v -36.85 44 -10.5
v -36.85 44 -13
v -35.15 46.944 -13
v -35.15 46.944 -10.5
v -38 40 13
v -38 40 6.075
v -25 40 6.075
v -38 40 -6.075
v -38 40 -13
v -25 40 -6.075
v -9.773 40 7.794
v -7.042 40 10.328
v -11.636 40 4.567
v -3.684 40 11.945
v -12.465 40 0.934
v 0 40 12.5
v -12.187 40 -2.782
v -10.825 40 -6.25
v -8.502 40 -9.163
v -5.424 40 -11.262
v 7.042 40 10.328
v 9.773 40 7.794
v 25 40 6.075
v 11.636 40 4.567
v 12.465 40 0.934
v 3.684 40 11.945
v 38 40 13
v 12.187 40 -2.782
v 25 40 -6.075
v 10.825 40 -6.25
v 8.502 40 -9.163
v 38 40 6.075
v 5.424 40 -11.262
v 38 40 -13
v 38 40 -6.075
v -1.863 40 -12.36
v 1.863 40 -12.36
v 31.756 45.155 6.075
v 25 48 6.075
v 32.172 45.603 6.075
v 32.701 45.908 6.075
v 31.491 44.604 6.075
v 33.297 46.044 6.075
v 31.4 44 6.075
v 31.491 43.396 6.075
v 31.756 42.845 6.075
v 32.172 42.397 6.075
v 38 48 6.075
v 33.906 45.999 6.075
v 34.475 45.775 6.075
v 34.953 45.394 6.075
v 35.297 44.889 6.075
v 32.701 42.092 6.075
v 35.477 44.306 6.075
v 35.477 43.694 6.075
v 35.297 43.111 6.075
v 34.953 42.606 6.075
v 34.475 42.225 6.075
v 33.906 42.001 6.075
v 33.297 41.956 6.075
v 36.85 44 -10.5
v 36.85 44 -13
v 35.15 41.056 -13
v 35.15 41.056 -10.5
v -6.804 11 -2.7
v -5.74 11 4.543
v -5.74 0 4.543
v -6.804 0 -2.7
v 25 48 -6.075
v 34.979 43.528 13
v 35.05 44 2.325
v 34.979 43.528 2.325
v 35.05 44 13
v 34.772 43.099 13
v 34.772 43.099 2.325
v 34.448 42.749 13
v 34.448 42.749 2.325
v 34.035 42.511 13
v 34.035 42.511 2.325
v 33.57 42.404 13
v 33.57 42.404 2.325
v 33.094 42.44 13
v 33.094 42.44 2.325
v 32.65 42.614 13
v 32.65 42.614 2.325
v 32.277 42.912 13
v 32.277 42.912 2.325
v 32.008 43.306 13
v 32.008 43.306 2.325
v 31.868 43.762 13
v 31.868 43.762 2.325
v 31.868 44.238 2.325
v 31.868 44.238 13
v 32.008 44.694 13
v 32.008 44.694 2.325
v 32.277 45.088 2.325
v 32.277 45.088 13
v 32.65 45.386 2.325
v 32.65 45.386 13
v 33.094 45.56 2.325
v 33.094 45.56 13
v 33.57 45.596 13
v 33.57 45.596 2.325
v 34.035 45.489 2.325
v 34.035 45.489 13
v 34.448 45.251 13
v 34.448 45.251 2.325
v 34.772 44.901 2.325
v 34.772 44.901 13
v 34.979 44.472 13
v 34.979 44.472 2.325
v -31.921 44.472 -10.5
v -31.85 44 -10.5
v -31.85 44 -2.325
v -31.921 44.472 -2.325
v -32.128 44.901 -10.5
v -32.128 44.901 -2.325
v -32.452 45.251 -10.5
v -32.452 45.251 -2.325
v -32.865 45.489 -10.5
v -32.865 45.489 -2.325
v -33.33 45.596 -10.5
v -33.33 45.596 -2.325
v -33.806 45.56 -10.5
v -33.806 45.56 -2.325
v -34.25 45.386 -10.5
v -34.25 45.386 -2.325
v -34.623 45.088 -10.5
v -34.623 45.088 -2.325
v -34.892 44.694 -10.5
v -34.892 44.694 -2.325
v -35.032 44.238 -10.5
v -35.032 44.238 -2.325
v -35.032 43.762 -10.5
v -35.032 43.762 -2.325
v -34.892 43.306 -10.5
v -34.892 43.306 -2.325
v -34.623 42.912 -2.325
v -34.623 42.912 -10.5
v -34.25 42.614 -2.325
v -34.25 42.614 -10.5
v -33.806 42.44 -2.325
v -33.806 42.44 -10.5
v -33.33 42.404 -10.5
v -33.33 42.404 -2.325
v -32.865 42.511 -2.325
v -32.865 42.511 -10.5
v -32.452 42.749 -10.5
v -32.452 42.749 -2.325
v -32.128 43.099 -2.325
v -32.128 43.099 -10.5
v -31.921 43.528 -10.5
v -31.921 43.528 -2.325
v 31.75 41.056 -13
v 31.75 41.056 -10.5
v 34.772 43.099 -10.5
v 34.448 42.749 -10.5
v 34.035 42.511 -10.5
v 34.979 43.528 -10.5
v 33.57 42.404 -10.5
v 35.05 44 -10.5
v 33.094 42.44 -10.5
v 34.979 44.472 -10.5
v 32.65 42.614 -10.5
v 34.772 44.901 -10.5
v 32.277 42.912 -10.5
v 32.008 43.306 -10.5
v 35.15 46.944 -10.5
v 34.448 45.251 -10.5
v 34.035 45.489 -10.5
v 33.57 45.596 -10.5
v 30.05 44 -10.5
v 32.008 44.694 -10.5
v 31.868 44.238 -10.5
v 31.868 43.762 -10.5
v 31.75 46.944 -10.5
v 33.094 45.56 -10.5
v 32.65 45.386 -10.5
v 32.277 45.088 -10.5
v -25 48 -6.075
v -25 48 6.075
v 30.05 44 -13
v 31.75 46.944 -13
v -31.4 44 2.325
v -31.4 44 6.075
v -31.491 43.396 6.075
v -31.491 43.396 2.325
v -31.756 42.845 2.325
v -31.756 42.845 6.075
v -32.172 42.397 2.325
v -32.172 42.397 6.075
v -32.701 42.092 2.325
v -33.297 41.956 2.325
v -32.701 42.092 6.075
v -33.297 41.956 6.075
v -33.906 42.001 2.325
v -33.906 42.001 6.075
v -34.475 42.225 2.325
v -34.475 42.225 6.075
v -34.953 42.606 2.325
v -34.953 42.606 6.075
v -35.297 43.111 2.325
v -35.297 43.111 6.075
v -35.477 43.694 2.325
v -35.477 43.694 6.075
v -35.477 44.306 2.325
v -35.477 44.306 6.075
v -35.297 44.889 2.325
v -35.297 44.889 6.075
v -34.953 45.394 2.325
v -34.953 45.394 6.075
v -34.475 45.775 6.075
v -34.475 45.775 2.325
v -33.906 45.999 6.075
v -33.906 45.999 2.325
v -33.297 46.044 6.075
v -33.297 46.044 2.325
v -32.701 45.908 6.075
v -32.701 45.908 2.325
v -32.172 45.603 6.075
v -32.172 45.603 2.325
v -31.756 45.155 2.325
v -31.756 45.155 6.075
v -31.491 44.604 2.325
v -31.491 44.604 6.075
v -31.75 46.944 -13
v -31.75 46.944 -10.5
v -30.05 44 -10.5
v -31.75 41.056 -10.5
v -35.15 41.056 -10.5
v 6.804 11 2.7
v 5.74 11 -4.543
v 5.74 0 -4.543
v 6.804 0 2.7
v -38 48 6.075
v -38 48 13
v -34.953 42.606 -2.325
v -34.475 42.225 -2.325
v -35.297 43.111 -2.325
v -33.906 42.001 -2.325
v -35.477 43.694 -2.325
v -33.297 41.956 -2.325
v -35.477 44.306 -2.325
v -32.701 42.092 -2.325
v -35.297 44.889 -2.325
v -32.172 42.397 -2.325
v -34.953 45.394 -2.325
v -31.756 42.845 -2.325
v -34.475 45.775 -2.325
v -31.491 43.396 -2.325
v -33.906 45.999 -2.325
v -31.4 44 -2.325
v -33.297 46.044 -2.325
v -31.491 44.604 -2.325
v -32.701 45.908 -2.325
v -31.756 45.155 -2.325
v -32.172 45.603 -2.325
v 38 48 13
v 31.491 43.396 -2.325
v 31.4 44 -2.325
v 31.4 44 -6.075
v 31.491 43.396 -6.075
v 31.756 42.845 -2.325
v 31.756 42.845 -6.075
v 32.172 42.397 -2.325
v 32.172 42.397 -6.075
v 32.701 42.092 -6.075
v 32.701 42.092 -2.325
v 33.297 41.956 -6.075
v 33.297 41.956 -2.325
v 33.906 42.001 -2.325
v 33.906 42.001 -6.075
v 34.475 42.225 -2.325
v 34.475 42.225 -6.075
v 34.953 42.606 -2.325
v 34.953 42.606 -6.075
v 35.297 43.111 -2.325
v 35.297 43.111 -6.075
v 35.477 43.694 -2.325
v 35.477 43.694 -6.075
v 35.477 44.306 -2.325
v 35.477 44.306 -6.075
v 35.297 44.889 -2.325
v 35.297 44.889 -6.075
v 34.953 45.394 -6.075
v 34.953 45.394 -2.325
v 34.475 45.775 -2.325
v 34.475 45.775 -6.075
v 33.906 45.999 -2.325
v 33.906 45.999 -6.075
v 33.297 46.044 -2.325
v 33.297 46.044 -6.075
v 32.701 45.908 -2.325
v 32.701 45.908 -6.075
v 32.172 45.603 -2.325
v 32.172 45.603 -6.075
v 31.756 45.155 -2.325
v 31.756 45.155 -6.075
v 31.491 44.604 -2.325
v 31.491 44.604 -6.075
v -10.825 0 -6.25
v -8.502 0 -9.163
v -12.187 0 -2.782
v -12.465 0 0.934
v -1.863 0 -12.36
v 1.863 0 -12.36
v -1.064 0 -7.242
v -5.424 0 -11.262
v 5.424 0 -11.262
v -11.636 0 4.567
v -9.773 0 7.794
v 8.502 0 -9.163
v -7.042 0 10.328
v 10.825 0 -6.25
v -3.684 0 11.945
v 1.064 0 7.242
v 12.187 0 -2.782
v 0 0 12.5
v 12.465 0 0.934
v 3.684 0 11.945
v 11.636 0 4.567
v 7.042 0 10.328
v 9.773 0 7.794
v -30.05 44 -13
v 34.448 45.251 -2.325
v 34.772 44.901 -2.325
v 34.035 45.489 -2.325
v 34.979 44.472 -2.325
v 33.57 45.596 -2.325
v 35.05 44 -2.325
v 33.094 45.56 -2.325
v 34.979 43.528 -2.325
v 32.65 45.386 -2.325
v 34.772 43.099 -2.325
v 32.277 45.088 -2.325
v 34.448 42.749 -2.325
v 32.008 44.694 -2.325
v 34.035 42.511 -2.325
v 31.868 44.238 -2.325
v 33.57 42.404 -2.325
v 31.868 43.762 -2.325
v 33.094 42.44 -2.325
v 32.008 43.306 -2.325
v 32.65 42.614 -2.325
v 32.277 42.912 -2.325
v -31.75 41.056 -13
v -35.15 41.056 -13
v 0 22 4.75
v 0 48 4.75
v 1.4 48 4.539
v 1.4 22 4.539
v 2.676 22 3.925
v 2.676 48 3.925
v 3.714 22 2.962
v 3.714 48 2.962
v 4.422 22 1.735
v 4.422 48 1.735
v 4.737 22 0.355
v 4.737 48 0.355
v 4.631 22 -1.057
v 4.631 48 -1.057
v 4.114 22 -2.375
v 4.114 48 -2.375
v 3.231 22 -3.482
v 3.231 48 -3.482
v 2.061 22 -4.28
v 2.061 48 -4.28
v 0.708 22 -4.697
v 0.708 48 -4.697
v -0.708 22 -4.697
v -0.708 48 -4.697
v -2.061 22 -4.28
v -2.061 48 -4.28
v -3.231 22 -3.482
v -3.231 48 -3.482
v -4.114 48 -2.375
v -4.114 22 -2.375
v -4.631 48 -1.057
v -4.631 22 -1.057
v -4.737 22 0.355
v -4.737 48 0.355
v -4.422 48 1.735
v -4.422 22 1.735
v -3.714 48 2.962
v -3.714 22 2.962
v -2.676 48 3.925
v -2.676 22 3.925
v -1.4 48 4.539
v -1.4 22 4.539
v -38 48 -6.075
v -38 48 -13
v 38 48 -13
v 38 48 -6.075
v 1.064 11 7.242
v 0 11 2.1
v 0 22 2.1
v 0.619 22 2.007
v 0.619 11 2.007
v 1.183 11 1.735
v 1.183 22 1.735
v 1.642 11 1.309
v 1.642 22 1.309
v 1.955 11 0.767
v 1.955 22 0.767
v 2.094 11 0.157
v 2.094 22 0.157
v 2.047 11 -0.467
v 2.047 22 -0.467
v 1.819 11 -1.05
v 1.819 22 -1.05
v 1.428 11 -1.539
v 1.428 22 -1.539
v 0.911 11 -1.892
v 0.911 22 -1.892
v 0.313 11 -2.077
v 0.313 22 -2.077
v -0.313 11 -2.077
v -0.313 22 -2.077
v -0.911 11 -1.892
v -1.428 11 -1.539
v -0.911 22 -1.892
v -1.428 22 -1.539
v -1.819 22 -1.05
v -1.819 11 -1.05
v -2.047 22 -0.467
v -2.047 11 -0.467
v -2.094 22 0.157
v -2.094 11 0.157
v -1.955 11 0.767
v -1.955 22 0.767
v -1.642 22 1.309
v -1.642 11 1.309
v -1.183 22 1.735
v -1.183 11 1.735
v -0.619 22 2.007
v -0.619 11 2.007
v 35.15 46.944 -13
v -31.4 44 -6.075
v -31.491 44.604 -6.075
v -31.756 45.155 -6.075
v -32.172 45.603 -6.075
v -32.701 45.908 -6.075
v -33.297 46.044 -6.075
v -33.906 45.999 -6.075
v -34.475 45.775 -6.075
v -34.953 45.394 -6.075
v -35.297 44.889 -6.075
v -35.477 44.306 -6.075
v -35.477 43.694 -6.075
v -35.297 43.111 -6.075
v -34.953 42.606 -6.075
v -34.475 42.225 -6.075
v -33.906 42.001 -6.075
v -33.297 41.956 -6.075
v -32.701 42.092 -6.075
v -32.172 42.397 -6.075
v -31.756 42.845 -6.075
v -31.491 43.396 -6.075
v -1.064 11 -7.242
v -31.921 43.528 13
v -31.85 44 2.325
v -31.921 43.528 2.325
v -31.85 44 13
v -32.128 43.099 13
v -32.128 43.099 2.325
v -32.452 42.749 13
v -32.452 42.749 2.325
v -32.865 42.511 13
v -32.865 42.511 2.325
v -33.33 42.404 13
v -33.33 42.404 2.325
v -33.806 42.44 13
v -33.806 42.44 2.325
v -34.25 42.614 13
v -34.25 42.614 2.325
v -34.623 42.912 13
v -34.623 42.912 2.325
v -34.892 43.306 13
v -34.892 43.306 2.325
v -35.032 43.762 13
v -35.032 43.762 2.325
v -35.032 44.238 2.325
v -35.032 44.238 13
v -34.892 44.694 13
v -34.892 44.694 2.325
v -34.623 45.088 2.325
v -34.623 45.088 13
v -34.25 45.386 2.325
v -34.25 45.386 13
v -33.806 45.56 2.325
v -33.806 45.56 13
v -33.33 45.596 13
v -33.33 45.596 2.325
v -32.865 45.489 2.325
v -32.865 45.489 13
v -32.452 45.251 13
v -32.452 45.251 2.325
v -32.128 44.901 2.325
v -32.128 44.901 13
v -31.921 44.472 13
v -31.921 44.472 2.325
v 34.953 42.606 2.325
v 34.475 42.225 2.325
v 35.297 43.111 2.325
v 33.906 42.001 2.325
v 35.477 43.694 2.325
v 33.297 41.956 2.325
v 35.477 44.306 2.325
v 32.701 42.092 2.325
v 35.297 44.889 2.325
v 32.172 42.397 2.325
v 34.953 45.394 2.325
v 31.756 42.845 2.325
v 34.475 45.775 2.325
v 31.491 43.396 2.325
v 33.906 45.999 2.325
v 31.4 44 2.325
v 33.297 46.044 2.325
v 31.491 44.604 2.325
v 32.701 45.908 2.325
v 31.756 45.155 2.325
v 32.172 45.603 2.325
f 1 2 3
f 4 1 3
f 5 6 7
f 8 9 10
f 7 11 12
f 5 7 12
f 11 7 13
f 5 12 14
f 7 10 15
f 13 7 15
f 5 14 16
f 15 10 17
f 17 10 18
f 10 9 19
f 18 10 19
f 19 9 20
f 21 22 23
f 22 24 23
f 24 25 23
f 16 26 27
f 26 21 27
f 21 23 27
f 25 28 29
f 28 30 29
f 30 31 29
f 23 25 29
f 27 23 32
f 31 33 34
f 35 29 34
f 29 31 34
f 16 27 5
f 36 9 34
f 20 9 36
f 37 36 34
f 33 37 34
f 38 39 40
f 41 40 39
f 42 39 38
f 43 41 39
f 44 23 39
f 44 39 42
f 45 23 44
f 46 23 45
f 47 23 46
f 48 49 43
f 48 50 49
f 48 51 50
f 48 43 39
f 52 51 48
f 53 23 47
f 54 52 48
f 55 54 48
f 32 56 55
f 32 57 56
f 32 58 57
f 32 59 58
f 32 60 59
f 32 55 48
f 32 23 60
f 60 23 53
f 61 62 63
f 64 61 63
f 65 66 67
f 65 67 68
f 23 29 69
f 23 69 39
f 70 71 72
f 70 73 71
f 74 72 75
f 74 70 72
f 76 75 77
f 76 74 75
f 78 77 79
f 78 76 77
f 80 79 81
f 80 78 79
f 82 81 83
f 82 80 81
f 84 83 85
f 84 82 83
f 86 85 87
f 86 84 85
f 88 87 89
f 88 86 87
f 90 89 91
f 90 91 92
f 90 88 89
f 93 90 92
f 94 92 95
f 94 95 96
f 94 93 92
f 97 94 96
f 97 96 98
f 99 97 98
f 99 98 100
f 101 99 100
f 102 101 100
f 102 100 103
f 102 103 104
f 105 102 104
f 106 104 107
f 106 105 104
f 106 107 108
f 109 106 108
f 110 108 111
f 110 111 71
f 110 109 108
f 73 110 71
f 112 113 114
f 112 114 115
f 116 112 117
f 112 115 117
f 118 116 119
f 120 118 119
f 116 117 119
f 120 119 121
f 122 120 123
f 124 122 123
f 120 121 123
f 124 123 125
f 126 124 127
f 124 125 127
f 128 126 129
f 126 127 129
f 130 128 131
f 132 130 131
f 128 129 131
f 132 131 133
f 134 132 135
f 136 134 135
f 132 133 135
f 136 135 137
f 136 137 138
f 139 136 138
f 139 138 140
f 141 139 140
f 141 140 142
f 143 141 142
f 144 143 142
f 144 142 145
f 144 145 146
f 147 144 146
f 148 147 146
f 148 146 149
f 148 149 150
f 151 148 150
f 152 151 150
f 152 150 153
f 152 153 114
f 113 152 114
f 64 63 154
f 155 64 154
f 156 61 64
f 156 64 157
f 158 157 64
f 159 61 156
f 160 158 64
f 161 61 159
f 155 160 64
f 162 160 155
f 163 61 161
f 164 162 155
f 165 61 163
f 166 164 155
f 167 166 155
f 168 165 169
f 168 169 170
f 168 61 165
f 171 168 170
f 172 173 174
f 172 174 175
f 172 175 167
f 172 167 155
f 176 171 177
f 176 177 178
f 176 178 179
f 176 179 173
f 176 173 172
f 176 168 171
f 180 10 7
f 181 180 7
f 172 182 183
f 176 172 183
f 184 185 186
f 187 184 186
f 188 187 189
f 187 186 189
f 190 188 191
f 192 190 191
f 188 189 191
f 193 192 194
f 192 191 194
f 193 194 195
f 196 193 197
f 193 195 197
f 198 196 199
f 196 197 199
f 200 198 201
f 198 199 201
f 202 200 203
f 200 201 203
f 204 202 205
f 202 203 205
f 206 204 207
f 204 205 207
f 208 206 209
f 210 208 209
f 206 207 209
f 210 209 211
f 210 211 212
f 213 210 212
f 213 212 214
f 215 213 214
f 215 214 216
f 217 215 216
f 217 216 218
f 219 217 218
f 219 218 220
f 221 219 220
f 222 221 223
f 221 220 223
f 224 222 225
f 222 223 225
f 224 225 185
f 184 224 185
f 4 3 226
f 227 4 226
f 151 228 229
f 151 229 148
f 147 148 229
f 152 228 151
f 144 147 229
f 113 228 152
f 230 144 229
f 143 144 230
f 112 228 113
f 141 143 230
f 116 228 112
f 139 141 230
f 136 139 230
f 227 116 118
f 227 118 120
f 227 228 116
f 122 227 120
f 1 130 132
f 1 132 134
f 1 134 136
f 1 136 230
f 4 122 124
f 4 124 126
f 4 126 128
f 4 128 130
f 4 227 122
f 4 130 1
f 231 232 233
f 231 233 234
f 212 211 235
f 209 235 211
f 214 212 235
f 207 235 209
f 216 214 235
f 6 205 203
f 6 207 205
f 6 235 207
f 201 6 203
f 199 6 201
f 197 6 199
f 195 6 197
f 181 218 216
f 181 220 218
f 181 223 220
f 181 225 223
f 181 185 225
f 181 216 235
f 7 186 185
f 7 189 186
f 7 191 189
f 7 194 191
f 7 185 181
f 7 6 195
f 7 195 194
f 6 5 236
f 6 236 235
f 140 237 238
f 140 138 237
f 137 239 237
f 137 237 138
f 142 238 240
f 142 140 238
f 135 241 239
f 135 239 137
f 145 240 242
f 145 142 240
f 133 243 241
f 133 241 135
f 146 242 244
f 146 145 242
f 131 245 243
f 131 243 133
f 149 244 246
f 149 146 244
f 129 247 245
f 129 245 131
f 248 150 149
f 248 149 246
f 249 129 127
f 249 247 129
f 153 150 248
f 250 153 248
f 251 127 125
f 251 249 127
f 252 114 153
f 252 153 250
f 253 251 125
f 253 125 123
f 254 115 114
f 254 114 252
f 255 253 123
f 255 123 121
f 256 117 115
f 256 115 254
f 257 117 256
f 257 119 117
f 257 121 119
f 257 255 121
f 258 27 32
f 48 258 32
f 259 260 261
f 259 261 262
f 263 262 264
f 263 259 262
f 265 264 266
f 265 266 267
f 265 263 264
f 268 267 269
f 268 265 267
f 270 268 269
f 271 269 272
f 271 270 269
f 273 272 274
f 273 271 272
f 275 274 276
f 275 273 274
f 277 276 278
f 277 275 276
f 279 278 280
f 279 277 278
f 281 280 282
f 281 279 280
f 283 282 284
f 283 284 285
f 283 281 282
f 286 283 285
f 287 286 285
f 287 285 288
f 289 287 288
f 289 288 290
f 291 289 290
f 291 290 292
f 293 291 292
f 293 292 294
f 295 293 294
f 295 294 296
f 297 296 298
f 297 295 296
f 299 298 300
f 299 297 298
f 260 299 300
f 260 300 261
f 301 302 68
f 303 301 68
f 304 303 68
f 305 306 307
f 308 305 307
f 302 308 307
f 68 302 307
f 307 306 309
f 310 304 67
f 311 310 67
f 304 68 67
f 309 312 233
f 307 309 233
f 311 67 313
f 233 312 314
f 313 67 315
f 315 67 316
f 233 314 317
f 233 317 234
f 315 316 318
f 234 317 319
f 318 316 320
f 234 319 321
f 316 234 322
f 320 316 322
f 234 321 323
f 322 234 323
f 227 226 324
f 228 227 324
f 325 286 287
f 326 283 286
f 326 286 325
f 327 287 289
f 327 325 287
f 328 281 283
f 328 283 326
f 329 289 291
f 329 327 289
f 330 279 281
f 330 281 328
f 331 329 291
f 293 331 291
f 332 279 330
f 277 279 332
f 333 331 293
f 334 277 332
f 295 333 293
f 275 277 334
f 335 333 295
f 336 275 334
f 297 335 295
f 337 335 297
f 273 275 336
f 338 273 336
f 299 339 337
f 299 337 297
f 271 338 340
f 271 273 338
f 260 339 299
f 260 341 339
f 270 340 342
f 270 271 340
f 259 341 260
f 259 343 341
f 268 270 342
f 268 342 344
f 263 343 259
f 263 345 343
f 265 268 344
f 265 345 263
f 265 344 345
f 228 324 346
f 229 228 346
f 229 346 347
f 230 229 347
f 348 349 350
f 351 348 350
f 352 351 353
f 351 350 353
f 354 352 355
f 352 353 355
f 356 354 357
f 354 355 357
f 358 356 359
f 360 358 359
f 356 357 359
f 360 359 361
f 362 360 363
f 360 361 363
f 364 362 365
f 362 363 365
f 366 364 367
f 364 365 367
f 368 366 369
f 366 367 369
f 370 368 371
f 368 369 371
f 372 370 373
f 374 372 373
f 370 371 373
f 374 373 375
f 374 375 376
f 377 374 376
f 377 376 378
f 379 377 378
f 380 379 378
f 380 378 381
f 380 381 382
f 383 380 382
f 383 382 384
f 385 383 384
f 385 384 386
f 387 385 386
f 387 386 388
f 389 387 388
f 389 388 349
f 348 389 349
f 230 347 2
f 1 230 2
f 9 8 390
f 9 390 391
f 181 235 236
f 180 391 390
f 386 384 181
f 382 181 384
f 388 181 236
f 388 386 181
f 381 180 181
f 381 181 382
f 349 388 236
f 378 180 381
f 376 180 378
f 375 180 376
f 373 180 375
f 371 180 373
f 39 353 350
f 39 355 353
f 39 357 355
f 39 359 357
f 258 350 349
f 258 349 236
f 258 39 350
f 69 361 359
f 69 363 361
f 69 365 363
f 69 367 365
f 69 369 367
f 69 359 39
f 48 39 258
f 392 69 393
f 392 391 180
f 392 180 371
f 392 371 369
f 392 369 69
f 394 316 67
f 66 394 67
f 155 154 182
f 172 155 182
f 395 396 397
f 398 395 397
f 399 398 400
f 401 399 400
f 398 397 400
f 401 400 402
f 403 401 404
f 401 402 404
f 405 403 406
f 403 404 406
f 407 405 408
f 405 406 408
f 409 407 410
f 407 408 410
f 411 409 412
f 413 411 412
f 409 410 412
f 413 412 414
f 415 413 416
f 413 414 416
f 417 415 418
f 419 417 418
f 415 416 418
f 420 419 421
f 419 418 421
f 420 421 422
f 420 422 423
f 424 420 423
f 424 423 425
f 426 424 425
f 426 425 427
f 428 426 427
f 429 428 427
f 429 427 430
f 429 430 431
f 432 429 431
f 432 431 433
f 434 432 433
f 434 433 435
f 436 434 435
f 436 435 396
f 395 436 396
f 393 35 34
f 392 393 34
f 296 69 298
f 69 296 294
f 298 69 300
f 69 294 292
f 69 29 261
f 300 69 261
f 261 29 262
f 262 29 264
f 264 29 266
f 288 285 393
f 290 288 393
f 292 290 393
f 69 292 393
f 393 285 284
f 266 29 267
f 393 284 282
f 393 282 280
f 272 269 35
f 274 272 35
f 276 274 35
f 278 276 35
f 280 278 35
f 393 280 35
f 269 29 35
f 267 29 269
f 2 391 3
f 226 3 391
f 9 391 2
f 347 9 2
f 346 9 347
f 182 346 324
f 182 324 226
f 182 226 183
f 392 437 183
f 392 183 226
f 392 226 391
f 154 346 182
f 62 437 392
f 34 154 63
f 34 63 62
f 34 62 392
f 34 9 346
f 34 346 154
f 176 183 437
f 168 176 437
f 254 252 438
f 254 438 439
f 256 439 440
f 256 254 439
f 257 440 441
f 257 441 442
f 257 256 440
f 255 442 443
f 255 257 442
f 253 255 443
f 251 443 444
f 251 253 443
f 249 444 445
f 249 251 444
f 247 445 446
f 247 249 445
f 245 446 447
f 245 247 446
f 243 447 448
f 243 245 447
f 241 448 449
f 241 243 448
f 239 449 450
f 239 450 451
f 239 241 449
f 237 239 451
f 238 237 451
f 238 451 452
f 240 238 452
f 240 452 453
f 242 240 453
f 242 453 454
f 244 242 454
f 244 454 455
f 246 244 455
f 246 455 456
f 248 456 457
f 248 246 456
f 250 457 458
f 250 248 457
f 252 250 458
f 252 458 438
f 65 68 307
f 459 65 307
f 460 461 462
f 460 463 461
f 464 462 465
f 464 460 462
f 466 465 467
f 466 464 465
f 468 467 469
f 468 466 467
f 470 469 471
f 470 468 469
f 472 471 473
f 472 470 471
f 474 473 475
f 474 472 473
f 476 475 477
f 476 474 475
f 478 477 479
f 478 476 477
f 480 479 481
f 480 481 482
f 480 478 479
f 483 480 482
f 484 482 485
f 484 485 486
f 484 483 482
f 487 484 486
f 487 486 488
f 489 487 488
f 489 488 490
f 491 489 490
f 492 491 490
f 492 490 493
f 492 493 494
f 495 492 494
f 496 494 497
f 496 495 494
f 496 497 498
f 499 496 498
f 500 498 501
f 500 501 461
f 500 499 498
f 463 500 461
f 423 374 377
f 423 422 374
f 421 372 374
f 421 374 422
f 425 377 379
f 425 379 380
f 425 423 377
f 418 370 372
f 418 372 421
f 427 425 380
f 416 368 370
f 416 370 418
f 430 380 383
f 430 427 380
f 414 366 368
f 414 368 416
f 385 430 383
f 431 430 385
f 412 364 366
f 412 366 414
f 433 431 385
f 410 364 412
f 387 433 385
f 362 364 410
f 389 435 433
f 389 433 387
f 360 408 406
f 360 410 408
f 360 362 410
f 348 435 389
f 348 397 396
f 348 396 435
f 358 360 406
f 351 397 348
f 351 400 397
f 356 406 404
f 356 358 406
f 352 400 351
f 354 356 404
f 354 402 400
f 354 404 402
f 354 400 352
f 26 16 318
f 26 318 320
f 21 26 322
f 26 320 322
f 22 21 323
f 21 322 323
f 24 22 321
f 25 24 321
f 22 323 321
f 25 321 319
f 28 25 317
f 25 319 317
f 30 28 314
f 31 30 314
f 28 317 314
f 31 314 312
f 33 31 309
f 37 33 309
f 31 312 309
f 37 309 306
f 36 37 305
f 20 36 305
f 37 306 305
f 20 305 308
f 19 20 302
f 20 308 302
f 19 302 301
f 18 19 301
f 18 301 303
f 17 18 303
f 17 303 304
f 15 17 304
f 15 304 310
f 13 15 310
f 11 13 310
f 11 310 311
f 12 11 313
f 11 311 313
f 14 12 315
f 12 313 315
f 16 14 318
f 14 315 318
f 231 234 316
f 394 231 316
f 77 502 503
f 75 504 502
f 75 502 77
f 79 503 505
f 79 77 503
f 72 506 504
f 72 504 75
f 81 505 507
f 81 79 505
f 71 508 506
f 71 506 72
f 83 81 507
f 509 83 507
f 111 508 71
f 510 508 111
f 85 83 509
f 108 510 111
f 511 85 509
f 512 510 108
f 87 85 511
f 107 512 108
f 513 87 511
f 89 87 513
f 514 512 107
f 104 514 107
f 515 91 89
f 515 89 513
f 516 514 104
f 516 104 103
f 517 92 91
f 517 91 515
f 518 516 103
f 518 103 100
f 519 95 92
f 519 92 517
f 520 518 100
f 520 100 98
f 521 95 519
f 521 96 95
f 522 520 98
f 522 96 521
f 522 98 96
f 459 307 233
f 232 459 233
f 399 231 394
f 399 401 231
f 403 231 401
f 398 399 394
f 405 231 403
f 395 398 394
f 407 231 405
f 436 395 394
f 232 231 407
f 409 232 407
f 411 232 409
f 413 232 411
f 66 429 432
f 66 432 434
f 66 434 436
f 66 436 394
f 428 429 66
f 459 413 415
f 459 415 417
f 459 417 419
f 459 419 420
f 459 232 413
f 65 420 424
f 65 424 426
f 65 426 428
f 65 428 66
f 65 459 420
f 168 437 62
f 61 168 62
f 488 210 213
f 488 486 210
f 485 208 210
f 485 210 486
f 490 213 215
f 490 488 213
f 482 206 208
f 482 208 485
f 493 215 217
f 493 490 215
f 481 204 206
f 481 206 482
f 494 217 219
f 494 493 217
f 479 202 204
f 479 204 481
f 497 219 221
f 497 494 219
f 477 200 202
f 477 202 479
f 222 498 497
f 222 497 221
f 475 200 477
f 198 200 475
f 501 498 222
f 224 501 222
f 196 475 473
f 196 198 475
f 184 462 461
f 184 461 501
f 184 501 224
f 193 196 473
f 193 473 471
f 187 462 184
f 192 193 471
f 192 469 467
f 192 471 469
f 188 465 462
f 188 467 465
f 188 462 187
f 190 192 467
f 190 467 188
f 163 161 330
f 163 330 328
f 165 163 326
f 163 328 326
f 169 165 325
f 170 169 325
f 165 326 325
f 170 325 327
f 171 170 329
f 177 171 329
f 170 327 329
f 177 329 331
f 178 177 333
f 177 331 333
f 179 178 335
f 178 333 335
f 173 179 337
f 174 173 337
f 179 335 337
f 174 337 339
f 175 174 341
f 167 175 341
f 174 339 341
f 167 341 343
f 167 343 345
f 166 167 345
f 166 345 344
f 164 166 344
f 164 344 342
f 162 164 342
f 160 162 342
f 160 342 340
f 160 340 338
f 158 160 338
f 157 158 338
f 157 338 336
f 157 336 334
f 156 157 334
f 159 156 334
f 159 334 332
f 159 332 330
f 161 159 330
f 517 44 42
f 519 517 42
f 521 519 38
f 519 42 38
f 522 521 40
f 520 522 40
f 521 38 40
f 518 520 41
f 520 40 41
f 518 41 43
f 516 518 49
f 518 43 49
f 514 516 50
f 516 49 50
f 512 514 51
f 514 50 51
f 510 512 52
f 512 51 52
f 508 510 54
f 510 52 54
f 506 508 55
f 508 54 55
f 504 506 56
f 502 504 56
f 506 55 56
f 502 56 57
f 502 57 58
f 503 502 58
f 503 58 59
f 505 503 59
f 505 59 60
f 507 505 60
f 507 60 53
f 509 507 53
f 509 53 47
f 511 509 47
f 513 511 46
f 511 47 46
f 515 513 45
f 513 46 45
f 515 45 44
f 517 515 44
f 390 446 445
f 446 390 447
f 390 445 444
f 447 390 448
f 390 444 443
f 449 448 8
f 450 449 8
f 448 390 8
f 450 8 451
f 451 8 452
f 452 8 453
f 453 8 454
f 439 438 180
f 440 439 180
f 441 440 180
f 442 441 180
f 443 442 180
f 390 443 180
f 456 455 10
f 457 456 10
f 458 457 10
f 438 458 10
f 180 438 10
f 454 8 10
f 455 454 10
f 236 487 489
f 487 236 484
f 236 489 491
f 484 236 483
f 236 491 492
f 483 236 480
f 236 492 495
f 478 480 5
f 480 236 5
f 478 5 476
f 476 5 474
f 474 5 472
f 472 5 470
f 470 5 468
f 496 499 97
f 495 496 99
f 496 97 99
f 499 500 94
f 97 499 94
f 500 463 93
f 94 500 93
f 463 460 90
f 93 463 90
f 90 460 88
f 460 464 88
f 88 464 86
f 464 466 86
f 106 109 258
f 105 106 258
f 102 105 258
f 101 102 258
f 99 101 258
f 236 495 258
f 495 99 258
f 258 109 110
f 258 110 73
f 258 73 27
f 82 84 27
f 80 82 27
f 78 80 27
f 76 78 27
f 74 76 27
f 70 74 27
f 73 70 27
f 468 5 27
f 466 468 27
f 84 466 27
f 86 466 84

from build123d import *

# Parameters (mm, degrees)
SKETCH_10_R         = 12.5
EXTRUDE_5_DEPTH     = 40
CUT_EXTRUDE_1_DEPTH = 11
SKETCH_12_R         = 4.75
CUT_EXTRUDE_2_DEPTH = 18
SKETCH_13_R         = 2.1
CUT_EXTRUDE_3_DEPTH = 20
SKETCH_14_W         = 76
SKETCH_14_H         = 26
EXTRUDE_8_DEPTH     = 8
SKETCH_15_R         = 4.75
CUT_EXTRUDE_4_DEPTH = 8
SKETCH_16_R         = 1.6
CUT_EXTRUDE_5_DEPTH = 26
SKETCH_17_W         = 13
SKETCH_17_H         = 12.15
CUT_EXTRUDE_6_DEPTH = 8
SKETCH_18_R         = 2.05
SKETCH_18_R_2       = 1.6
EXTRUDE_9_DEPTH     = 3.75
EXTRUDE_START       = 3.75
SKETCH_19_R         = 2.05
SKETCH_19_R_2       = 1.6
EXTRUDE_10_DEPTH    = 3.75
SKETCH_20_R         = 2.05
SKETCH_20_R_2       = 1.6
EXTRUDE_11_DEPTH    = 3.75
SKETCH_21_R         = 2.05
SKETCH_21_R_2       = 1.6
EXTRUDE_12_DEPTH    = 3.75
CUT_EXTRUDE_7_DEPTH = 2.5


with BuildPart() as part:
    # 草图10 → 凸台-拉伸5 (new body)
    with BuildSketch(Plane(origin=(0, 0, 0), x_dir=(1, 0, 0), z_dir=(0, 1, 0))):
        with Locations(Location((0, 0, 0), (0, 0, 270))):
            Circle(SKETCH_10_R)
    extrude(amount=EXTRUDE_5_DEPTH)

    # 草图11 → 切除-拉伸1 (cut)
    with BuildSketch(Plane(origin=(0, 0, 0), x_dir=(-1, 0, 0), z_dir=(0, -1, 0))):
        Polygon((5.739953665, -4.542612896), (6.803995, 2.699639243), (1.064041335, 7.242252139), (-5.739953665, 4.542612896), (-6.803995, -2.699639243), (-1.064041335, -7.242252139), align=None)
    extrude(amount=-CUT_EXTRUDE_1_DEPTH, mode=Mode.SUBTRACT)

    # 草图12 → 切除-拉伸2 (cut)
    with BuildSketch(Plane(origin=(0, 40, 0), x_dir=(1, 0, 0), z_dir=(0, 1, 0))):
        with Locations(Location((0, 0, 0), (0, 0, 270))):
            Circle(SKETCH_12_R)
    extrude(amount=-CUT_EXTRUDE_2_DEPTH, mode=Mode.SUBTRACT)

    # 草图13 → 切除-拉伸3 (cut)
    with BuildSketch(Plane(origin=(0, 22, 0), x_dir=(1, 0, 0), z_dir=(0, 1, 0))):
        with Locations(Location((0, 0, 0), (0, 0, 270))):
            Circle(SKETCH_13_R)
    extrude(amount=-CUT_EXTRUDE_3_DEPTH, mode=Mode.SUBTRACT)

    # 草图14 → 凸台-拉伸8 (add)
    with BuildSketch(Plane(origin=(0, 40, 0), x_dir=(1, 0, 0), z_dir=(0, 1, 0))):
        Rectangle(SKETCH_14_W, SKETCH_14_H)
    extrude(amount=EXTRUDE_8_DEPTH)

    # 草图15 → 切除-拉伸4 (cut)
    with BuildSketch(Plane(origin=(0, 48, 0), x_dir=(1, 0, 0), z_dir=(0, 1, 0))):
        with Locations(Location((0, 0, 0), (0, 0, 270))):
            Circle(SKETCH_15_R)
    extrude(amount=-CUT_EXTRUDE_4_DEPTH, mode=Mode.SUBTRACT)

    # 草图16 → 切除-拉伸5 (cut)
    with BuildSketch(Plane.XY.offset(13)):
        with Locations((-33.45, 44)):
            Circle(SKETCH_16_R)
        with Locations((33.45, 44)):
            Circle(SKETCH_16_R)
    extrude(amount=-CUT_EXTRUDE_5_DEPTH, mode=Mode.SUBTRACT)

    # 草图17 → 切除-拉伸6 (cut)
    with BuildSketch(Plane.XZ.offset(-40)):
        with Locations((31.5, 0)):
            Rectangle(SKETCH_17_W, SKETCH_17_H)
        with Locations((-31.5, 0)):
            Rectangle(SKETCH_17_W, SKETCH_17_H)
    extrude(amount=-CUT_EXTRUDE_6_DEPTH, mode=Mode.SUBTRACT)

    # 草图18 → 凸台-拉伸9 (add)
    with BuildSketch(Plane(origin=(0, 0, 6.075), x_dir=(-1, 0, 0), z_dir=(0, 0, -1))):
        with Locations(Location((33.45, 44, 0), (0, 0, 180))):
            Circle(SKETCH_18_R)
        with Locations(Location((33.45, 44, 0), (0, 0, 180))):
            Circle(SKETCH_18_R_2, mode=Mode.SUBTRACT)
    extrude(amount=EXTRUDE_9_DEPTH)

    # 草图19 → 凸台-拉伸10 (add)
    with BuildSketch(Plane.XY.offset(-6.075).offset(EXTRUDE_START)):
        with Locations((-33.45, 44)):
            Circle(SKETCH_19_R)
        with Locations((-33.45, 44)):
            Circle(SKETCH_19_R_2, mode=Mode.SUBTRACT)
    extrude(amount=-EXTRUDE_10_DEPTH)

    # 草图20 → 凸台-拉伸11 (add)
    with BuildSketch(Plane.XY.offset(-6.075).offset(EXTRUDE_START)):
        with Locations(Location((33.45, 44, 0), (0, 0, 180))):
            Circle(SKETCH_20_R)
        with Locations((33.45, 44)):
            Circle(SKETCH_20_R_2, mode=Mode.SUBTRACT)
    extrude(amount=-EXTRUDE_11_DEPTH)

    # 草图21 → 凸台-拉伸12 (add)
    with BuildSketch(Plane(origin=(0, 0, 6.075), x_dir=(-1, 0, 0), z_dir=(0, 0, -1))):
        with Locations((-33.45, 44)):
            Circle(SKETCH_21_R)
        with Locations(Location((-33.45, 44, 0), (0, 0, 180))):
            Circle(SKETCH_21_R_2, mode=Mode.SUBTRACT)
    extrude(amount=EXTRUDE_12_DEPTH)

    # 草图22 → 切除-拉伸7 (cut)
    with BuildSketch(Plane(origin=(0, 0, -13), x_dir=(-1, 0, 0), z_dir=(0, 0, -1))):
        Polygon((-30.05, 44), (-31.75, 46.944486373), (-35.15, 46.944486373), (-36.85, 44), (-35.15, 41.055513627), (-31.75, 41.055513627), align=None)
        Polygon((36.85, 44), (35.15, 46.944486373), (31.75, 46.944486373), (30.05, 44), (31.75, 41.055513627), (35.15, 41.055513627), align=None)
    extrude(amount=-CUT_EXTRUDE_7_DEPTH, mode=Mode.SUBTRACT)


solid = part.part
